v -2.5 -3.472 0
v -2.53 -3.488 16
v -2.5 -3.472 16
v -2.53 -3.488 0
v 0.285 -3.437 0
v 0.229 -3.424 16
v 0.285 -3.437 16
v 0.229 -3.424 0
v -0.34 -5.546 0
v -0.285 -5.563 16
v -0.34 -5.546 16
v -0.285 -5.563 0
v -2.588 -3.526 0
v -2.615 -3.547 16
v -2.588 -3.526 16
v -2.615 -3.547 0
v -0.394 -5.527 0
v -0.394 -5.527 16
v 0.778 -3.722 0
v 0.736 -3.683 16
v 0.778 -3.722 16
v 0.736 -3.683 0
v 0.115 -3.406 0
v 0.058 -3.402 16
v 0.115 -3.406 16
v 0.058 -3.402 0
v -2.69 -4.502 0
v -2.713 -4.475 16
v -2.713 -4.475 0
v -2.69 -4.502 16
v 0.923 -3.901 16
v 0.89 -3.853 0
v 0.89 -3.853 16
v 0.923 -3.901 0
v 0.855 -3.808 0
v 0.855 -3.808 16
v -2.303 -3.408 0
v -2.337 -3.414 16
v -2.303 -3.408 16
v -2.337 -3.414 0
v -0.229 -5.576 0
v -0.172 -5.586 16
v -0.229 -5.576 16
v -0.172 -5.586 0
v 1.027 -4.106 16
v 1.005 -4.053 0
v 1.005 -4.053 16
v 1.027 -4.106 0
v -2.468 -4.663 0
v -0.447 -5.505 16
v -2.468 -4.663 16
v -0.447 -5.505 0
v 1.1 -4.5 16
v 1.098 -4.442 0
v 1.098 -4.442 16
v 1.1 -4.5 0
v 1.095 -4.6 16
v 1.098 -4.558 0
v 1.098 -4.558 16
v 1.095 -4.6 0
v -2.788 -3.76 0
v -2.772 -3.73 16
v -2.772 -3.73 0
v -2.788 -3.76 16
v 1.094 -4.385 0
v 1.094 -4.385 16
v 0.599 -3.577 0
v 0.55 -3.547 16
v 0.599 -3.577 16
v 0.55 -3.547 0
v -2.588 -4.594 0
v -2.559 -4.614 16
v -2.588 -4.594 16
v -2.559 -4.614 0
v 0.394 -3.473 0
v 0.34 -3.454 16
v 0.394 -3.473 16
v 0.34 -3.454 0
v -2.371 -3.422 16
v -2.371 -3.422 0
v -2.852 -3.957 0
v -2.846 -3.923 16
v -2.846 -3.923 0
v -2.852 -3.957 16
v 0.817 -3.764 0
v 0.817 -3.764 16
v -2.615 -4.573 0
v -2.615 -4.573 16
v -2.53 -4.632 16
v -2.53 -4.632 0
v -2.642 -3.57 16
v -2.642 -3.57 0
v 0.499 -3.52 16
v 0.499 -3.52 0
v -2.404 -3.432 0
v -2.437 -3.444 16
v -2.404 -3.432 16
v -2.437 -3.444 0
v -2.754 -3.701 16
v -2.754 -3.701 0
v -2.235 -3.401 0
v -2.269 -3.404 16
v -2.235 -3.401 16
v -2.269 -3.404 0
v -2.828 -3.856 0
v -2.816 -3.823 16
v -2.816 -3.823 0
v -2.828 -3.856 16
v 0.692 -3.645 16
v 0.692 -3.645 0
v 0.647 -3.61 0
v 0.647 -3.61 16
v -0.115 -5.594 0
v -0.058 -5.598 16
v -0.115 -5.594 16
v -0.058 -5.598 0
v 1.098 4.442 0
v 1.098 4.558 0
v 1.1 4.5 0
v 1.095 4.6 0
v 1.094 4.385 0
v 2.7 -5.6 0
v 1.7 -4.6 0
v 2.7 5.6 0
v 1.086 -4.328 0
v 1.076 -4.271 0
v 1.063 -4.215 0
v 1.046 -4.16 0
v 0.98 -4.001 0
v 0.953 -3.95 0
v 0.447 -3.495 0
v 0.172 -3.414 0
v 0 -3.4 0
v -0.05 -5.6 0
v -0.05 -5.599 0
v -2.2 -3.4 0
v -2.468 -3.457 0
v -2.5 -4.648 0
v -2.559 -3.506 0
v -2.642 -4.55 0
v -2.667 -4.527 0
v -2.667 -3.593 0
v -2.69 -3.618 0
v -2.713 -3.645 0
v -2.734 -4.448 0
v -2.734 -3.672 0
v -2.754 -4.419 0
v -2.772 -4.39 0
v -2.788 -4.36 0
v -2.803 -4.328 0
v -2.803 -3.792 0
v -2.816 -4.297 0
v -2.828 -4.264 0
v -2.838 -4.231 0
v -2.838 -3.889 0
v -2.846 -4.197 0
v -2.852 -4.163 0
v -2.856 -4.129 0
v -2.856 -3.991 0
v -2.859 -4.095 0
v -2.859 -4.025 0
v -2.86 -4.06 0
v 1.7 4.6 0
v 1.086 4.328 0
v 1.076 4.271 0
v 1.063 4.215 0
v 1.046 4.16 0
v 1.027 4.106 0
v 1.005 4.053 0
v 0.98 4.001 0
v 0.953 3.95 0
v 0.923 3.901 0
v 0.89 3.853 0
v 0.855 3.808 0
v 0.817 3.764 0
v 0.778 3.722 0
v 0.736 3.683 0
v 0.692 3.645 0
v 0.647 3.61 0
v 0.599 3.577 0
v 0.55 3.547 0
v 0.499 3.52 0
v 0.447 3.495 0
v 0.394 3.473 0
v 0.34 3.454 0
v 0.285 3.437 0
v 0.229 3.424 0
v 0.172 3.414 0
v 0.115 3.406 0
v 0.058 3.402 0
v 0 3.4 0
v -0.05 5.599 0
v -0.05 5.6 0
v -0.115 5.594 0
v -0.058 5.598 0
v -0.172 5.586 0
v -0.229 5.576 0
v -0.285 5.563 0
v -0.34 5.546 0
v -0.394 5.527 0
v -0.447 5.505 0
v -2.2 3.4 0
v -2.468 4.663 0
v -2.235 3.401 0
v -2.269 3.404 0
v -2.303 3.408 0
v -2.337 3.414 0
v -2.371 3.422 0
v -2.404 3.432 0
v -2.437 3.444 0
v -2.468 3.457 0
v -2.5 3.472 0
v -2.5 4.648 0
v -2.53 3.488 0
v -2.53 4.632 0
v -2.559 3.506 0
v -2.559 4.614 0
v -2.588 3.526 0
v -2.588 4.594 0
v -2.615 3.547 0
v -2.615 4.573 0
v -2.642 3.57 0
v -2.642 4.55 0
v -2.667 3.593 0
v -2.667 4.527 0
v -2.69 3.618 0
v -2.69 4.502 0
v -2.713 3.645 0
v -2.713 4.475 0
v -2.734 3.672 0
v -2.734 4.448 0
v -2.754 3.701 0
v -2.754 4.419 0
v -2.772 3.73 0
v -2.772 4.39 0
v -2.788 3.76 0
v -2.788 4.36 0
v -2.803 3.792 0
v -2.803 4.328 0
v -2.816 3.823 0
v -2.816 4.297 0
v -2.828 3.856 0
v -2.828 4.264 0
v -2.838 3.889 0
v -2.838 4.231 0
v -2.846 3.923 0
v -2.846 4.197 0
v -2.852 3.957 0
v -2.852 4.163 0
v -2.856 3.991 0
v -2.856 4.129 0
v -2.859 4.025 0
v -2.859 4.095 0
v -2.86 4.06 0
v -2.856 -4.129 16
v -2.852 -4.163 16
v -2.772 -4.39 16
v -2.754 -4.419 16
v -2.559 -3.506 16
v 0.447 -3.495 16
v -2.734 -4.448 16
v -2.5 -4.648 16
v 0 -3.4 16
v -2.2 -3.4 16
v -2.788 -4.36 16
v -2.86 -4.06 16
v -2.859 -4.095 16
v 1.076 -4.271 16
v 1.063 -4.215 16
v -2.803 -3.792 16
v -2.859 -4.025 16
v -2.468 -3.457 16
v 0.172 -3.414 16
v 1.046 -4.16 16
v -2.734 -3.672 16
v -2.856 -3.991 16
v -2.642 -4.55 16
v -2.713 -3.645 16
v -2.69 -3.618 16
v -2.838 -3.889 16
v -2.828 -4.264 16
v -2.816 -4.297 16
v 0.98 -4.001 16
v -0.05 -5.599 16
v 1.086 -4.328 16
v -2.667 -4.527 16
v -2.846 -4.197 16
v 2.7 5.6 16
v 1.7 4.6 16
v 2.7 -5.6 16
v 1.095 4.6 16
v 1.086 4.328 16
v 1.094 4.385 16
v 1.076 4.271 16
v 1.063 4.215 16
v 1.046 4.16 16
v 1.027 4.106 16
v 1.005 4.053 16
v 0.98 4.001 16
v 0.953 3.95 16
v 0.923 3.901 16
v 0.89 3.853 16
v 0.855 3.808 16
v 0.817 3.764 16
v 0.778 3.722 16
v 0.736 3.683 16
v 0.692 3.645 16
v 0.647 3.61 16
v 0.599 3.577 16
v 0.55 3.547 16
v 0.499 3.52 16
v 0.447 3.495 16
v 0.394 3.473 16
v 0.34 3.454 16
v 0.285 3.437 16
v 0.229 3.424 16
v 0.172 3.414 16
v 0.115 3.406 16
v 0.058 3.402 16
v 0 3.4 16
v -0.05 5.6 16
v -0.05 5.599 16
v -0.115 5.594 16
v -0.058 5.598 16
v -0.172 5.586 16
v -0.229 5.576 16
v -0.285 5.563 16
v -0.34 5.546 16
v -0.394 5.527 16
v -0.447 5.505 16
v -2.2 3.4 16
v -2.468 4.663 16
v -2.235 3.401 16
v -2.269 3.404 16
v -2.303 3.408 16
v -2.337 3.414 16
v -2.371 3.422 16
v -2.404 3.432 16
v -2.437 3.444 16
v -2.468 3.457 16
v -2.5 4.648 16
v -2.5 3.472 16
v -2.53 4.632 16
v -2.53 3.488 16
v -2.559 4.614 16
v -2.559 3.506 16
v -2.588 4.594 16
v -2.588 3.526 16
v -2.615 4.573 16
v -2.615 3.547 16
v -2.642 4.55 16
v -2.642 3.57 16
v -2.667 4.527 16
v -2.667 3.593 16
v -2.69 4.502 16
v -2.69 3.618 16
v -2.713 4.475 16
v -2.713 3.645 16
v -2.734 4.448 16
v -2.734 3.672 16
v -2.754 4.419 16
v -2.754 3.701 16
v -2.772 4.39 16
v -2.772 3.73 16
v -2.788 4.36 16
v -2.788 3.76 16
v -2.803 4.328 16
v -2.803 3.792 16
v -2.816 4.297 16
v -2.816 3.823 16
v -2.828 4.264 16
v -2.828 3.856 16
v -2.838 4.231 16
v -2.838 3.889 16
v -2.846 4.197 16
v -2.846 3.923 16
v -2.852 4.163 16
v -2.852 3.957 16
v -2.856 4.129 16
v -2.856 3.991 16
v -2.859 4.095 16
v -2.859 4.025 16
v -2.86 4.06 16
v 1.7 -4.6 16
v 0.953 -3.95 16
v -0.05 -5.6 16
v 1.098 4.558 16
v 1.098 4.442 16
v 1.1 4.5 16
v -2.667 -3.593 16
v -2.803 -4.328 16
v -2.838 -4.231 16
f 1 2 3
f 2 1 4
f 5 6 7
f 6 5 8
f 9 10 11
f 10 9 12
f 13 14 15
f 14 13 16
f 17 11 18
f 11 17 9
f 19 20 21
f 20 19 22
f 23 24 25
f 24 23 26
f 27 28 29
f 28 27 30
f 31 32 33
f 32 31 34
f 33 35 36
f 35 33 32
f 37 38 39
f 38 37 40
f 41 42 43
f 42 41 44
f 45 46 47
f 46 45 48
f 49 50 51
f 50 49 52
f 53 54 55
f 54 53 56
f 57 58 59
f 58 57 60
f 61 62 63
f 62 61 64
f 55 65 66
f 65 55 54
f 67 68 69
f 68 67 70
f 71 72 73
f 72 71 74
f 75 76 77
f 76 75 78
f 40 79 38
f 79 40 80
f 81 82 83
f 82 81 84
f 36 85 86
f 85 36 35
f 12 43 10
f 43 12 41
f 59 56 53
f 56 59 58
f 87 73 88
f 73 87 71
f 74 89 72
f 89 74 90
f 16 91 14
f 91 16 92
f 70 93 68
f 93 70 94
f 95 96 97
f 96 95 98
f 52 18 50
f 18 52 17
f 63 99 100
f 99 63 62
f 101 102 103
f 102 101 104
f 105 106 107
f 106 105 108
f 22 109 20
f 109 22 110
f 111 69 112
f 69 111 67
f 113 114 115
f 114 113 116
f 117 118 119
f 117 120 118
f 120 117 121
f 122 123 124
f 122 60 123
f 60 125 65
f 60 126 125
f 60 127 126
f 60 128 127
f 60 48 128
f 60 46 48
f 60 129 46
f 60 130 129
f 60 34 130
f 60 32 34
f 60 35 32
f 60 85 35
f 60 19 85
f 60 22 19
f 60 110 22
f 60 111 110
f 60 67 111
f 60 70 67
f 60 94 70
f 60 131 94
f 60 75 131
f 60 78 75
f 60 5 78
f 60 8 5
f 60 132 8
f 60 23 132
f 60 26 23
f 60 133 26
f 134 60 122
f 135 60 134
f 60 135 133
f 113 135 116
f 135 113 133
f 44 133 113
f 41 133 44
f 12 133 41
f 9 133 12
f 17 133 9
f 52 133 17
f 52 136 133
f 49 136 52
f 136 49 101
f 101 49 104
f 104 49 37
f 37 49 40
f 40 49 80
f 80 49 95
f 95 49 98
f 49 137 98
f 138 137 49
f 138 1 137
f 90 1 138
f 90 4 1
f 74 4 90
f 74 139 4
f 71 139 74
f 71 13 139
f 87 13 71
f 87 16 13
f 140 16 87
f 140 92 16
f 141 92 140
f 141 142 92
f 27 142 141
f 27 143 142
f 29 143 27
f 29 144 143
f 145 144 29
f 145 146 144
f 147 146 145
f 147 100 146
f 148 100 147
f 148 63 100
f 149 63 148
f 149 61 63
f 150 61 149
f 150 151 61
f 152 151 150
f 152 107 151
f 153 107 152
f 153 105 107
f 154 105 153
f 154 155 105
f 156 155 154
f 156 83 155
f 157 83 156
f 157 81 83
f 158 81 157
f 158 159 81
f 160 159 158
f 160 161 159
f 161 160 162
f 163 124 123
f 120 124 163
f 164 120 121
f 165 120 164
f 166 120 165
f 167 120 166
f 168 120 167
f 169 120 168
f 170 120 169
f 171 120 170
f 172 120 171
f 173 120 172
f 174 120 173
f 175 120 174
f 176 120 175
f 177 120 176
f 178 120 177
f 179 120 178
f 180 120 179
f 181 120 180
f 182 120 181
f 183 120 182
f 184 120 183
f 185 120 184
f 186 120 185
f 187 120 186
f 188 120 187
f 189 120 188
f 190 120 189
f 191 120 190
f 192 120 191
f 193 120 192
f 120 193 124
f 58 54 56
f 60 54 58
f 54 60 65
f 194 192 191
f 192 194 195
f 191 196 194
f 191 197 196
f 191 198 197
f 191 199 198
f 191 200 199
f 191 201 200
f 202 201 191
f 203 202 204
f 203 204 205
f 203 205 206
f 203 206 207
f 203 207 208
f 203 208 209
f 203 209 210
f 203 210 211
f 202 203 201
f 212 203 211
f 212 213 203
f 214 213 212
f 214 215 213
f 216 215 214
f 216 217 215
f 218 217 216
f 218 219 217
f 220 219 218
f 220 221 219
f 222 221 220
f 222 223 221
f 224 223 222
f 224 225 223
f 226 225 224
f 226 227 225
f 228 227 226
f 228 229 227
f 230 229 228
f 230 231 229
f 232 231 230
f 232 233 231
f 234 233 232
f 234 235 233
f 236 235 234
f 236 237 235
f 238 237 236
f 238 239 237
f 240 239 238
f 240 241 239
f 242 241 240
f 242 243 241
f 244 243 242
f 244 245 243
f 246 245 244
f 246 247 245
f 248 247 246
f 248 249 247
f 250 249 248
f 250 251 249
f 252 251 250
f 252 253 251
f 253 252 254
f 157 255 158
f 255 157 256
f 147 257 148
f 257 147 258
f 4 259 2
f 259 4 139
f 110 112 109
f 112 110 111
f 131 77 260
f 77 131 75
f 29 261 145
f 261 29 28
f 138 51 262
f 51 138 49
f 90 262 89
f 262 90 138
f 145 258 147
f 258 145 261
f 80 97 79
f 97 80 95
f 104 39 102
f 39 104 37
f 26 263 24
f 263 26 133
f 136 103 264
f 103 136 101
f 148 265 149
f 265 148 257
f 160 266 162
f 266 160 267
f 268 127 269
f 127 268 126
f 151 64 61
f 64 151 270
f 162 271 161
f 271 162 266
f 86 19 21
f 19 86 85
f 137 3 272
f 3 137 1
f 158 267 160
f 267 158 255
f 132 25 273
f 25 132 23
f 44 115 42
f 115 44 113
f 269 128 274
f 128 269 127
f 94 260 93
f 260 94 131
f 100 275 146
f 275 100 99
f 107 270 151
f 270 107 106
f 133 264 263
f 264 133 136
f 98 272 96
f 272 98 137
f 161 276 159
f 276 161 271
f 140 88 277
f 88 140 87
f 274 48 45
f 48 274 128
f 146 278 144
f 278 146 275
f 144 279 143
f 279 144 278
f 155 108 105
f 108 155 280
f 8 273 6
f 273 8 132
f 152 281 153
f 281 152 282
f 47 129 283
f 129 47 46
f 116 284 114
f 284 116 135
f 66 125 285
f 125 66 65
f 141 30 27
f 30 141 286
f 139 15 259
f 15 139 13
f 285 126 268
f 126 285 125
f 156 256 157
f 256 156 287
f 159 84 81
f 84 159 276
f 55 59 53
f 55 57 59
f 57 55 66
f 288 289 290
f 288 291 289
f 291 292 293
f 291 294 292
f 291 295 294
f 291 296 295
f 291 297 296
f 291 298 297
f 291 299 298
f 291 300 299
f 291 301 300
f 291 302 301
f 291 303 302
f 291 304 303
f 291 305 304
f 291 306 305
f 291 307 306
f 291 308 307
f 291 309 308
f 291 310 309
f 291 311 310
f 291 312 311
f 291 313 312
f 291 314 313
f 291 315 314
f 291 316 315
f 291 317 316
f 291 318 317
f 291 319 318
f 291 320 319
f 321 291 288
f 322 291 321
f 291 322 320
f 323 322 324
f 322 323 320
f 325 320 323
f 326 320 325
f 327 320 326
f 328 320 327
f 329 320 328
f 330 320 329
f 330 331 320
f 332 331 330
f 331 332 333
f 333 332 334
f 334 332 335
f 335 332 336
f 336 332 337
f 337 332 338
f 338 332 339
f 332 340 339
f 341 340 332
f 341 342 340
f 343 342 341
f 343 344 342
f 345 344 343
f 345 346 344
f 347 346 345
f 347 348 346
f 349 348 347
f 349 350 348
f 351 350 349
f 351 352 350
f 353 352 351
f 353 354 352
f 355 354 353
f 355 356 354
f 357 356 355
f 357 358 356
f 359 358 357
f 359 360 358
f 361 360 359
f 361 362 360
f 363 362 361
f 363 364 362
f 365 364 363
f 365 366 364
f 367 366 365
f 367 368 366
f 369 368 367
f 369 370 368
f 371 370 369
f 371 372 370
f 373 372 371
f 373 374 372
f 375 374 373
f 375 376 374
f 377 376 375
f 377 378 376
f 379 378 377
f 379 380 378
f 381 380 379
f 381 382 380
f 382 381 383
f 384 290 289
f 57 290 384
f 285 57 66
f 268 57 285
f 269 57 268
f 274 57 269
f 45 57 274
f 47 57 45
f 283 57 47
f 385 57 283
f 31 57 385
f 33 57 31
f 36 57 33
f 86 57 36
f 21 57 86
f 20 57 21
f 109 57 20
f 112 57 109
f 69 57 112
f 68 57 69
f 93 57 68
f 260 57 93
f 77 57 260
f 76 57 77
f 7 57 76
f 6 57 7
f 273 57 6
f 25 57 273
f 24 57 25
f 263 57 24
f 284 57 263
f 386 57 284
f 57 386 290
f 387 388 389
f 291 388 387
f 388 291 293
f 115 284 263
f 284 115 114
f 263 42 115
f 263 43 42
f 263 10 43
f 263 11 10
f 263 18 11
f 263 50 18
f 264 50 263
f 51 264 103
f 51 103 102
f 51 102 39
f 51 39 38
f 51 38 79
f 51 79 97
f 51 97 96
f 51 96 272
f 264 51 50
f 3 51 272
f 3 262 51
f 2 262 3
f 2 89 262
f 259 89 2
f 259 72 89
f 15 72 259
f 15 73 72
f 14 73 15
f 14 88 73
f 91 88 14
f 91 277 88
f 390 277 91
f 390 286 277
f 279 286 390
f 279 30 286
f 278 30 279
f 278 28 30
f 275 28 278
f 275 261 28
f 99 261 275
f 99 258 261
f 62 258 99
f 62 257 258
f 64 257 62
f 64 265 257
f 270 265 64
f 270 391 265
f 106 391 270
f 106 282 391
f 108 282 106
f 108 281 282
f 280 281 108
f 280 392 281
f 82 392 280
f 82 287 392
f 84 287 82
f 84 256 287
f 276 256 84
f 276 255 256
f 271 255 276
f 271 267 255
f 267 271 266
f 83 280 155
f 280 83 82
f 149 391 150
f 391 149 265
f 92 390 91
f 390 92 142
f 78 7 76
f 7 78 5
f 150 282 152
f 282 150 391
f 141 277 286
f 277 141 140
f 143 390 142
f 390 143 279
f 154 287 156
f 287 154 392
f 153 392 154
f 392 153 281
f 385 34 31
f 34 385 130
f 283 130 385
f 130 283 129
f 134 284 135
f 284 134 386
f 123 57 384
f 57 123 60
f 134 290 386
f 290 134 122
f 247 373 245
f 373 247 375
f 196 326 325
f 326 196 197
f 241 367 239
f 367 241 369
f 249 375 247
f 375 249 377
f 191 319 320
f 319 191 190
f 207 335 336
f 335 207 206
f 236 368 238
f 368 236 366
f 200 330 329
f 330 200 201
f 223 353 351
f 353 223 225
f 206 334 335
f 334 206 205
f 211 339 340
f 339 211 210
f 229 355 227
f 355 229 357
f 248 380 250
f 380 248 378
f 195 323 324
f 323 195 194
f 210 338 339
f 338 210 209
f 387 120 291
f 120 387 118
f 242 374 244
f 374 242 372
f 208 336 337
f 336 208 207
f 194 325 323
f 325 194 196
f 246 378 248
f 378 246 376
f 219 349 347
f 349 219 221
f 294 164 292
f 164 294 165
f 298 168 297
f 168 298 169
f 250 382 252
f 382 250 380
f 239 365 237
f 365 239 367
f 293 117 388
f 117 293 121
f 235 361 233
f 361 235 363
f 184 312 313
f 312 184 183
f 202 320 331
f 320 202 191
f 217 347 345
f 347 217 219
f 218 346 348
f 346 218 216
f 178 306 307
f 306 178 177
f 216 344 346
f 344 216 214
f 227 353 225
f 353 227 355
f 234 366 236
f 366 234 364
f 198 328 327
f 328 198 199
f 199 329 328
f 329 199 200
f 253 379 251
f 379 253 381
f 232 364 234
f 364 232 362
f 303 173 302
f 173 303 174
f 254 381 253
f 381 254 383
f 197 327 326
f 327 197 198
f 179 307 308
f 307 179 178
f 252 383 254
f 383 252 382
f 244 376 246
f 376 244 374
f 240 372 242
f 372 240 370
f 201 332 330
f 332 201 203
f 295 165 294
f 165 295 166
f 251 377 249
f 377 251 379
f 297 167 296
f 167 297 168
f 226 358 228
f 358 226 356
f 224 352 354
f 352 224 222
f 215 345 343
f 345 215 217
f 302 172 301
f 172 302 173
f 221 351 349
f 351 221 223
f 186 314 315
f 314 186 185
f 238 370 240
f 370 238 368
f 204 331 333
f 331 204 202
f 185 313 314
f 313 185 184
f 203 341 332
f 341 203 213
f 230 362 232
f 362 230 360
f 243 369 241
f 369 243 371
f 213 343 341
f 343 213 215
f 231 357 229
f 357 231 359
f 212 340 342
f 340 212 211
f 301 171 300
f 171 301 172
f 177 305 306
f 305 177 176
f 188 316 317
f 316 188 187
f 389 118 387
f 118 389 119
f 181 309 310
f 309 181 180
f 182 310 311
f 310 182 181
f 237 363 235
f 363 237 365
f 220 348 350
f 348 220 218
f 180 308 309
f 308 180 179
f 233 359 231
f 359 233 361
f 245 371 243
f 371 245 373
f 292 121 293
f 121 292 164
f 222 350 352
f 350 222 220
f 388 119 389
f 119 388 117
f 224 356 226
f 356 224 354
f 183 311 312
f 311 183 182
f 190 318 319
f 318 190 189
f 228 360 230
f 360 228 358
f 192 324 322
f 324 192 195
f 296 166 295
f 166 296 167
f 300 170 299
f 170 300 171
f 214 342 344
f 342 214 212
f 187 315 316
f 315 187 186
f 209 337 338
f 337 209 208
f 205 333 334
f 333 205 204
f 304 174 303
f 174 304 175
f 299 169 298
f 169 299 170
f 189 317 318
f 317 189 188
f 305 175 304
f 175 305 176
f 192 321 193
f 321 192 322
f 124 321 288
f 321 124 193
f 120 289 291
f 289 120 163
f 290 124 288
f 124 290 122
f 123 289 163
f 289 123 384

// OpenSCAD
// [FL_INDEX: keywords="openscad, 3d_parametric, Customizable_Platform_Clips, csg_solid" | COT="Parametric OpenSCAD design from 3DCodeverse"]
// Title: Customizable Platform Clips



_style = "square"; // [round, square]

// height of the platform (use a slightly smaller value, about 0.2mm to make the clip tight)
_platformGap = 6.8;


// length of the clip
_length = 16.0; //[4:50]


// thickness of the clip.
_wallThickness = 1.0;


// size of the top of the clip
_diameter = 2.2;

////////////////////////////////////////////////////////////////////////

// only works from [0 to 180] degrees, runs clockwise from 12 o'clock
module smallArc(radius0, radius1, angle, depth) {
	thickness = radius1 - radius0;
	eps = 0.01;

	union() {
		difference() {
			// full arc
			cylinder(r=radius1, h=depth, center=true);
			cylinder(r=radius0, h=depth+2*eps, center=true);

			for(z=[0, 180 - angle]) {
				rotate([0,0,z])
				translate([-radius1,0,0])			
				cube(size = [radius1*2, radius1*2, depth+eps], center=true);
			}
		}
	}
}



// arc from [0 to 360] degrees with rounded ends, runs clockwise from 12 o'clock, rounded tips not included in angle computation
module roundArc(radius0, radius1, angle, depth) {
	thickness = radius1 - radius0;
	cutAngle = 360-angle;
	centerRadius = (radius0 + radius1)/2.0;
	union() {
		if (angle > 180) {
			smallArc(radius0, radius1, 180, depth);
			rotate([0,0,-180]) {
				smallArc(radius0, radius1, angle-180, depth);
			}
		} else {
			smallArc(radius0, radius1, angle, depth);
		}

		// round ends
		for(t = [ [0,centerRadius,0], 
					 [centerRadius * -sin(cutAngle), centerRadius * cos(cutAngle),0] ]) {
			translate(t) {
				cylinder(r=thickness/2, h=depth, center=true);
			}
		}
	}
}

module clip(arcRadius, angle, height, outerThickness, hingeRadius, hingeAngle, clipAngle, hingeGap) {
	ir = arcRadius;
	or = ir + outerThickness;
	clipRadius = hingeRadius;
	hx = (ir-hingeRadius)*sin(angle/2);
	hy = (ir-hingeRadius)*cos(angle/2);
	cx = (ir-clipRadius)*sin(angle/2);
	cy = (ir-clipRadius)*cos(angle/2);

	union() {

		difference() {
			//	spine
			rotate([0,0,angle/2]) {
				roundArc(ir, or, angle, height);
			}
		}

		// hinge
		translate([-hx, hy, 0])
		rotate([0,0,angle/2+hingeAngle]) {
			roundArc(hingeRadius, hingeRadius+outerThickness, hingeAngle, height);
		}

		// clip
		translate([cx, cy, 0])
		rotate([0,0,-angle/2]) {
			roundArc(clipRadius, clipRadius+outerThickness, clipAngle, height);
		}
	}
}

// reuse code from the arc clip
module buildRoundClip(gap, width, wall, diameter) {
	curvature = 25;
	clipAngle = 120;
	hingeAngle = 280 - wall*10;
	length = gap + diameter/3 + wall; // approximate
	radius = length / (2 *(curvature/100));
	angle = 2 * asin(length/(2*radius));

	translate([0,-radius,width/2]) {
		clip(radius, angle, width, wall, diameter/2, hingeAngle, clipAngle);
	}
}
////////////////////////////////////////////////////////////////////////

module buildSquareClip(gap, width, wall, diameter) {
	radius = diameter/2;
	tipRadius = diameter * 0.3;
	clipDepth = 1.0; // depth of the clip prongs
	space = 0.6; // space between clip and spine
	eps = 0.1;
	for (y = [-1,1]) {
		hull() {
			translate([0,y*(gap/2 + radius),0]) {
				cylinder(r=radius, h=width);
			}
			translate([-diameter*clipDepth,y*(gap/2 + tipRadius),0]) {
				cylinder(r=tipRadius, h=width);
			}
		}
		
		translate([(radius+space)/2, y*(gap/2 + diameter - wall/2), width/2]) {
			cube(size=[radius + space + eps, wall, width], center=true);
		}
	}
	translate([radius + space + wall/2, 0, width/2]) {
		cube(size=[wall, gap + diameter*2, width], center=true);
	}
}

module make($fn = 120) {
	if (_style == "round") {
		buildRoundClip(_platformGap, _length, _wallThickness, _diameter);
	} else {
		buildSquareClip(_platformGap, _length, _wallThickness, _diameter);
	}
}

make();
